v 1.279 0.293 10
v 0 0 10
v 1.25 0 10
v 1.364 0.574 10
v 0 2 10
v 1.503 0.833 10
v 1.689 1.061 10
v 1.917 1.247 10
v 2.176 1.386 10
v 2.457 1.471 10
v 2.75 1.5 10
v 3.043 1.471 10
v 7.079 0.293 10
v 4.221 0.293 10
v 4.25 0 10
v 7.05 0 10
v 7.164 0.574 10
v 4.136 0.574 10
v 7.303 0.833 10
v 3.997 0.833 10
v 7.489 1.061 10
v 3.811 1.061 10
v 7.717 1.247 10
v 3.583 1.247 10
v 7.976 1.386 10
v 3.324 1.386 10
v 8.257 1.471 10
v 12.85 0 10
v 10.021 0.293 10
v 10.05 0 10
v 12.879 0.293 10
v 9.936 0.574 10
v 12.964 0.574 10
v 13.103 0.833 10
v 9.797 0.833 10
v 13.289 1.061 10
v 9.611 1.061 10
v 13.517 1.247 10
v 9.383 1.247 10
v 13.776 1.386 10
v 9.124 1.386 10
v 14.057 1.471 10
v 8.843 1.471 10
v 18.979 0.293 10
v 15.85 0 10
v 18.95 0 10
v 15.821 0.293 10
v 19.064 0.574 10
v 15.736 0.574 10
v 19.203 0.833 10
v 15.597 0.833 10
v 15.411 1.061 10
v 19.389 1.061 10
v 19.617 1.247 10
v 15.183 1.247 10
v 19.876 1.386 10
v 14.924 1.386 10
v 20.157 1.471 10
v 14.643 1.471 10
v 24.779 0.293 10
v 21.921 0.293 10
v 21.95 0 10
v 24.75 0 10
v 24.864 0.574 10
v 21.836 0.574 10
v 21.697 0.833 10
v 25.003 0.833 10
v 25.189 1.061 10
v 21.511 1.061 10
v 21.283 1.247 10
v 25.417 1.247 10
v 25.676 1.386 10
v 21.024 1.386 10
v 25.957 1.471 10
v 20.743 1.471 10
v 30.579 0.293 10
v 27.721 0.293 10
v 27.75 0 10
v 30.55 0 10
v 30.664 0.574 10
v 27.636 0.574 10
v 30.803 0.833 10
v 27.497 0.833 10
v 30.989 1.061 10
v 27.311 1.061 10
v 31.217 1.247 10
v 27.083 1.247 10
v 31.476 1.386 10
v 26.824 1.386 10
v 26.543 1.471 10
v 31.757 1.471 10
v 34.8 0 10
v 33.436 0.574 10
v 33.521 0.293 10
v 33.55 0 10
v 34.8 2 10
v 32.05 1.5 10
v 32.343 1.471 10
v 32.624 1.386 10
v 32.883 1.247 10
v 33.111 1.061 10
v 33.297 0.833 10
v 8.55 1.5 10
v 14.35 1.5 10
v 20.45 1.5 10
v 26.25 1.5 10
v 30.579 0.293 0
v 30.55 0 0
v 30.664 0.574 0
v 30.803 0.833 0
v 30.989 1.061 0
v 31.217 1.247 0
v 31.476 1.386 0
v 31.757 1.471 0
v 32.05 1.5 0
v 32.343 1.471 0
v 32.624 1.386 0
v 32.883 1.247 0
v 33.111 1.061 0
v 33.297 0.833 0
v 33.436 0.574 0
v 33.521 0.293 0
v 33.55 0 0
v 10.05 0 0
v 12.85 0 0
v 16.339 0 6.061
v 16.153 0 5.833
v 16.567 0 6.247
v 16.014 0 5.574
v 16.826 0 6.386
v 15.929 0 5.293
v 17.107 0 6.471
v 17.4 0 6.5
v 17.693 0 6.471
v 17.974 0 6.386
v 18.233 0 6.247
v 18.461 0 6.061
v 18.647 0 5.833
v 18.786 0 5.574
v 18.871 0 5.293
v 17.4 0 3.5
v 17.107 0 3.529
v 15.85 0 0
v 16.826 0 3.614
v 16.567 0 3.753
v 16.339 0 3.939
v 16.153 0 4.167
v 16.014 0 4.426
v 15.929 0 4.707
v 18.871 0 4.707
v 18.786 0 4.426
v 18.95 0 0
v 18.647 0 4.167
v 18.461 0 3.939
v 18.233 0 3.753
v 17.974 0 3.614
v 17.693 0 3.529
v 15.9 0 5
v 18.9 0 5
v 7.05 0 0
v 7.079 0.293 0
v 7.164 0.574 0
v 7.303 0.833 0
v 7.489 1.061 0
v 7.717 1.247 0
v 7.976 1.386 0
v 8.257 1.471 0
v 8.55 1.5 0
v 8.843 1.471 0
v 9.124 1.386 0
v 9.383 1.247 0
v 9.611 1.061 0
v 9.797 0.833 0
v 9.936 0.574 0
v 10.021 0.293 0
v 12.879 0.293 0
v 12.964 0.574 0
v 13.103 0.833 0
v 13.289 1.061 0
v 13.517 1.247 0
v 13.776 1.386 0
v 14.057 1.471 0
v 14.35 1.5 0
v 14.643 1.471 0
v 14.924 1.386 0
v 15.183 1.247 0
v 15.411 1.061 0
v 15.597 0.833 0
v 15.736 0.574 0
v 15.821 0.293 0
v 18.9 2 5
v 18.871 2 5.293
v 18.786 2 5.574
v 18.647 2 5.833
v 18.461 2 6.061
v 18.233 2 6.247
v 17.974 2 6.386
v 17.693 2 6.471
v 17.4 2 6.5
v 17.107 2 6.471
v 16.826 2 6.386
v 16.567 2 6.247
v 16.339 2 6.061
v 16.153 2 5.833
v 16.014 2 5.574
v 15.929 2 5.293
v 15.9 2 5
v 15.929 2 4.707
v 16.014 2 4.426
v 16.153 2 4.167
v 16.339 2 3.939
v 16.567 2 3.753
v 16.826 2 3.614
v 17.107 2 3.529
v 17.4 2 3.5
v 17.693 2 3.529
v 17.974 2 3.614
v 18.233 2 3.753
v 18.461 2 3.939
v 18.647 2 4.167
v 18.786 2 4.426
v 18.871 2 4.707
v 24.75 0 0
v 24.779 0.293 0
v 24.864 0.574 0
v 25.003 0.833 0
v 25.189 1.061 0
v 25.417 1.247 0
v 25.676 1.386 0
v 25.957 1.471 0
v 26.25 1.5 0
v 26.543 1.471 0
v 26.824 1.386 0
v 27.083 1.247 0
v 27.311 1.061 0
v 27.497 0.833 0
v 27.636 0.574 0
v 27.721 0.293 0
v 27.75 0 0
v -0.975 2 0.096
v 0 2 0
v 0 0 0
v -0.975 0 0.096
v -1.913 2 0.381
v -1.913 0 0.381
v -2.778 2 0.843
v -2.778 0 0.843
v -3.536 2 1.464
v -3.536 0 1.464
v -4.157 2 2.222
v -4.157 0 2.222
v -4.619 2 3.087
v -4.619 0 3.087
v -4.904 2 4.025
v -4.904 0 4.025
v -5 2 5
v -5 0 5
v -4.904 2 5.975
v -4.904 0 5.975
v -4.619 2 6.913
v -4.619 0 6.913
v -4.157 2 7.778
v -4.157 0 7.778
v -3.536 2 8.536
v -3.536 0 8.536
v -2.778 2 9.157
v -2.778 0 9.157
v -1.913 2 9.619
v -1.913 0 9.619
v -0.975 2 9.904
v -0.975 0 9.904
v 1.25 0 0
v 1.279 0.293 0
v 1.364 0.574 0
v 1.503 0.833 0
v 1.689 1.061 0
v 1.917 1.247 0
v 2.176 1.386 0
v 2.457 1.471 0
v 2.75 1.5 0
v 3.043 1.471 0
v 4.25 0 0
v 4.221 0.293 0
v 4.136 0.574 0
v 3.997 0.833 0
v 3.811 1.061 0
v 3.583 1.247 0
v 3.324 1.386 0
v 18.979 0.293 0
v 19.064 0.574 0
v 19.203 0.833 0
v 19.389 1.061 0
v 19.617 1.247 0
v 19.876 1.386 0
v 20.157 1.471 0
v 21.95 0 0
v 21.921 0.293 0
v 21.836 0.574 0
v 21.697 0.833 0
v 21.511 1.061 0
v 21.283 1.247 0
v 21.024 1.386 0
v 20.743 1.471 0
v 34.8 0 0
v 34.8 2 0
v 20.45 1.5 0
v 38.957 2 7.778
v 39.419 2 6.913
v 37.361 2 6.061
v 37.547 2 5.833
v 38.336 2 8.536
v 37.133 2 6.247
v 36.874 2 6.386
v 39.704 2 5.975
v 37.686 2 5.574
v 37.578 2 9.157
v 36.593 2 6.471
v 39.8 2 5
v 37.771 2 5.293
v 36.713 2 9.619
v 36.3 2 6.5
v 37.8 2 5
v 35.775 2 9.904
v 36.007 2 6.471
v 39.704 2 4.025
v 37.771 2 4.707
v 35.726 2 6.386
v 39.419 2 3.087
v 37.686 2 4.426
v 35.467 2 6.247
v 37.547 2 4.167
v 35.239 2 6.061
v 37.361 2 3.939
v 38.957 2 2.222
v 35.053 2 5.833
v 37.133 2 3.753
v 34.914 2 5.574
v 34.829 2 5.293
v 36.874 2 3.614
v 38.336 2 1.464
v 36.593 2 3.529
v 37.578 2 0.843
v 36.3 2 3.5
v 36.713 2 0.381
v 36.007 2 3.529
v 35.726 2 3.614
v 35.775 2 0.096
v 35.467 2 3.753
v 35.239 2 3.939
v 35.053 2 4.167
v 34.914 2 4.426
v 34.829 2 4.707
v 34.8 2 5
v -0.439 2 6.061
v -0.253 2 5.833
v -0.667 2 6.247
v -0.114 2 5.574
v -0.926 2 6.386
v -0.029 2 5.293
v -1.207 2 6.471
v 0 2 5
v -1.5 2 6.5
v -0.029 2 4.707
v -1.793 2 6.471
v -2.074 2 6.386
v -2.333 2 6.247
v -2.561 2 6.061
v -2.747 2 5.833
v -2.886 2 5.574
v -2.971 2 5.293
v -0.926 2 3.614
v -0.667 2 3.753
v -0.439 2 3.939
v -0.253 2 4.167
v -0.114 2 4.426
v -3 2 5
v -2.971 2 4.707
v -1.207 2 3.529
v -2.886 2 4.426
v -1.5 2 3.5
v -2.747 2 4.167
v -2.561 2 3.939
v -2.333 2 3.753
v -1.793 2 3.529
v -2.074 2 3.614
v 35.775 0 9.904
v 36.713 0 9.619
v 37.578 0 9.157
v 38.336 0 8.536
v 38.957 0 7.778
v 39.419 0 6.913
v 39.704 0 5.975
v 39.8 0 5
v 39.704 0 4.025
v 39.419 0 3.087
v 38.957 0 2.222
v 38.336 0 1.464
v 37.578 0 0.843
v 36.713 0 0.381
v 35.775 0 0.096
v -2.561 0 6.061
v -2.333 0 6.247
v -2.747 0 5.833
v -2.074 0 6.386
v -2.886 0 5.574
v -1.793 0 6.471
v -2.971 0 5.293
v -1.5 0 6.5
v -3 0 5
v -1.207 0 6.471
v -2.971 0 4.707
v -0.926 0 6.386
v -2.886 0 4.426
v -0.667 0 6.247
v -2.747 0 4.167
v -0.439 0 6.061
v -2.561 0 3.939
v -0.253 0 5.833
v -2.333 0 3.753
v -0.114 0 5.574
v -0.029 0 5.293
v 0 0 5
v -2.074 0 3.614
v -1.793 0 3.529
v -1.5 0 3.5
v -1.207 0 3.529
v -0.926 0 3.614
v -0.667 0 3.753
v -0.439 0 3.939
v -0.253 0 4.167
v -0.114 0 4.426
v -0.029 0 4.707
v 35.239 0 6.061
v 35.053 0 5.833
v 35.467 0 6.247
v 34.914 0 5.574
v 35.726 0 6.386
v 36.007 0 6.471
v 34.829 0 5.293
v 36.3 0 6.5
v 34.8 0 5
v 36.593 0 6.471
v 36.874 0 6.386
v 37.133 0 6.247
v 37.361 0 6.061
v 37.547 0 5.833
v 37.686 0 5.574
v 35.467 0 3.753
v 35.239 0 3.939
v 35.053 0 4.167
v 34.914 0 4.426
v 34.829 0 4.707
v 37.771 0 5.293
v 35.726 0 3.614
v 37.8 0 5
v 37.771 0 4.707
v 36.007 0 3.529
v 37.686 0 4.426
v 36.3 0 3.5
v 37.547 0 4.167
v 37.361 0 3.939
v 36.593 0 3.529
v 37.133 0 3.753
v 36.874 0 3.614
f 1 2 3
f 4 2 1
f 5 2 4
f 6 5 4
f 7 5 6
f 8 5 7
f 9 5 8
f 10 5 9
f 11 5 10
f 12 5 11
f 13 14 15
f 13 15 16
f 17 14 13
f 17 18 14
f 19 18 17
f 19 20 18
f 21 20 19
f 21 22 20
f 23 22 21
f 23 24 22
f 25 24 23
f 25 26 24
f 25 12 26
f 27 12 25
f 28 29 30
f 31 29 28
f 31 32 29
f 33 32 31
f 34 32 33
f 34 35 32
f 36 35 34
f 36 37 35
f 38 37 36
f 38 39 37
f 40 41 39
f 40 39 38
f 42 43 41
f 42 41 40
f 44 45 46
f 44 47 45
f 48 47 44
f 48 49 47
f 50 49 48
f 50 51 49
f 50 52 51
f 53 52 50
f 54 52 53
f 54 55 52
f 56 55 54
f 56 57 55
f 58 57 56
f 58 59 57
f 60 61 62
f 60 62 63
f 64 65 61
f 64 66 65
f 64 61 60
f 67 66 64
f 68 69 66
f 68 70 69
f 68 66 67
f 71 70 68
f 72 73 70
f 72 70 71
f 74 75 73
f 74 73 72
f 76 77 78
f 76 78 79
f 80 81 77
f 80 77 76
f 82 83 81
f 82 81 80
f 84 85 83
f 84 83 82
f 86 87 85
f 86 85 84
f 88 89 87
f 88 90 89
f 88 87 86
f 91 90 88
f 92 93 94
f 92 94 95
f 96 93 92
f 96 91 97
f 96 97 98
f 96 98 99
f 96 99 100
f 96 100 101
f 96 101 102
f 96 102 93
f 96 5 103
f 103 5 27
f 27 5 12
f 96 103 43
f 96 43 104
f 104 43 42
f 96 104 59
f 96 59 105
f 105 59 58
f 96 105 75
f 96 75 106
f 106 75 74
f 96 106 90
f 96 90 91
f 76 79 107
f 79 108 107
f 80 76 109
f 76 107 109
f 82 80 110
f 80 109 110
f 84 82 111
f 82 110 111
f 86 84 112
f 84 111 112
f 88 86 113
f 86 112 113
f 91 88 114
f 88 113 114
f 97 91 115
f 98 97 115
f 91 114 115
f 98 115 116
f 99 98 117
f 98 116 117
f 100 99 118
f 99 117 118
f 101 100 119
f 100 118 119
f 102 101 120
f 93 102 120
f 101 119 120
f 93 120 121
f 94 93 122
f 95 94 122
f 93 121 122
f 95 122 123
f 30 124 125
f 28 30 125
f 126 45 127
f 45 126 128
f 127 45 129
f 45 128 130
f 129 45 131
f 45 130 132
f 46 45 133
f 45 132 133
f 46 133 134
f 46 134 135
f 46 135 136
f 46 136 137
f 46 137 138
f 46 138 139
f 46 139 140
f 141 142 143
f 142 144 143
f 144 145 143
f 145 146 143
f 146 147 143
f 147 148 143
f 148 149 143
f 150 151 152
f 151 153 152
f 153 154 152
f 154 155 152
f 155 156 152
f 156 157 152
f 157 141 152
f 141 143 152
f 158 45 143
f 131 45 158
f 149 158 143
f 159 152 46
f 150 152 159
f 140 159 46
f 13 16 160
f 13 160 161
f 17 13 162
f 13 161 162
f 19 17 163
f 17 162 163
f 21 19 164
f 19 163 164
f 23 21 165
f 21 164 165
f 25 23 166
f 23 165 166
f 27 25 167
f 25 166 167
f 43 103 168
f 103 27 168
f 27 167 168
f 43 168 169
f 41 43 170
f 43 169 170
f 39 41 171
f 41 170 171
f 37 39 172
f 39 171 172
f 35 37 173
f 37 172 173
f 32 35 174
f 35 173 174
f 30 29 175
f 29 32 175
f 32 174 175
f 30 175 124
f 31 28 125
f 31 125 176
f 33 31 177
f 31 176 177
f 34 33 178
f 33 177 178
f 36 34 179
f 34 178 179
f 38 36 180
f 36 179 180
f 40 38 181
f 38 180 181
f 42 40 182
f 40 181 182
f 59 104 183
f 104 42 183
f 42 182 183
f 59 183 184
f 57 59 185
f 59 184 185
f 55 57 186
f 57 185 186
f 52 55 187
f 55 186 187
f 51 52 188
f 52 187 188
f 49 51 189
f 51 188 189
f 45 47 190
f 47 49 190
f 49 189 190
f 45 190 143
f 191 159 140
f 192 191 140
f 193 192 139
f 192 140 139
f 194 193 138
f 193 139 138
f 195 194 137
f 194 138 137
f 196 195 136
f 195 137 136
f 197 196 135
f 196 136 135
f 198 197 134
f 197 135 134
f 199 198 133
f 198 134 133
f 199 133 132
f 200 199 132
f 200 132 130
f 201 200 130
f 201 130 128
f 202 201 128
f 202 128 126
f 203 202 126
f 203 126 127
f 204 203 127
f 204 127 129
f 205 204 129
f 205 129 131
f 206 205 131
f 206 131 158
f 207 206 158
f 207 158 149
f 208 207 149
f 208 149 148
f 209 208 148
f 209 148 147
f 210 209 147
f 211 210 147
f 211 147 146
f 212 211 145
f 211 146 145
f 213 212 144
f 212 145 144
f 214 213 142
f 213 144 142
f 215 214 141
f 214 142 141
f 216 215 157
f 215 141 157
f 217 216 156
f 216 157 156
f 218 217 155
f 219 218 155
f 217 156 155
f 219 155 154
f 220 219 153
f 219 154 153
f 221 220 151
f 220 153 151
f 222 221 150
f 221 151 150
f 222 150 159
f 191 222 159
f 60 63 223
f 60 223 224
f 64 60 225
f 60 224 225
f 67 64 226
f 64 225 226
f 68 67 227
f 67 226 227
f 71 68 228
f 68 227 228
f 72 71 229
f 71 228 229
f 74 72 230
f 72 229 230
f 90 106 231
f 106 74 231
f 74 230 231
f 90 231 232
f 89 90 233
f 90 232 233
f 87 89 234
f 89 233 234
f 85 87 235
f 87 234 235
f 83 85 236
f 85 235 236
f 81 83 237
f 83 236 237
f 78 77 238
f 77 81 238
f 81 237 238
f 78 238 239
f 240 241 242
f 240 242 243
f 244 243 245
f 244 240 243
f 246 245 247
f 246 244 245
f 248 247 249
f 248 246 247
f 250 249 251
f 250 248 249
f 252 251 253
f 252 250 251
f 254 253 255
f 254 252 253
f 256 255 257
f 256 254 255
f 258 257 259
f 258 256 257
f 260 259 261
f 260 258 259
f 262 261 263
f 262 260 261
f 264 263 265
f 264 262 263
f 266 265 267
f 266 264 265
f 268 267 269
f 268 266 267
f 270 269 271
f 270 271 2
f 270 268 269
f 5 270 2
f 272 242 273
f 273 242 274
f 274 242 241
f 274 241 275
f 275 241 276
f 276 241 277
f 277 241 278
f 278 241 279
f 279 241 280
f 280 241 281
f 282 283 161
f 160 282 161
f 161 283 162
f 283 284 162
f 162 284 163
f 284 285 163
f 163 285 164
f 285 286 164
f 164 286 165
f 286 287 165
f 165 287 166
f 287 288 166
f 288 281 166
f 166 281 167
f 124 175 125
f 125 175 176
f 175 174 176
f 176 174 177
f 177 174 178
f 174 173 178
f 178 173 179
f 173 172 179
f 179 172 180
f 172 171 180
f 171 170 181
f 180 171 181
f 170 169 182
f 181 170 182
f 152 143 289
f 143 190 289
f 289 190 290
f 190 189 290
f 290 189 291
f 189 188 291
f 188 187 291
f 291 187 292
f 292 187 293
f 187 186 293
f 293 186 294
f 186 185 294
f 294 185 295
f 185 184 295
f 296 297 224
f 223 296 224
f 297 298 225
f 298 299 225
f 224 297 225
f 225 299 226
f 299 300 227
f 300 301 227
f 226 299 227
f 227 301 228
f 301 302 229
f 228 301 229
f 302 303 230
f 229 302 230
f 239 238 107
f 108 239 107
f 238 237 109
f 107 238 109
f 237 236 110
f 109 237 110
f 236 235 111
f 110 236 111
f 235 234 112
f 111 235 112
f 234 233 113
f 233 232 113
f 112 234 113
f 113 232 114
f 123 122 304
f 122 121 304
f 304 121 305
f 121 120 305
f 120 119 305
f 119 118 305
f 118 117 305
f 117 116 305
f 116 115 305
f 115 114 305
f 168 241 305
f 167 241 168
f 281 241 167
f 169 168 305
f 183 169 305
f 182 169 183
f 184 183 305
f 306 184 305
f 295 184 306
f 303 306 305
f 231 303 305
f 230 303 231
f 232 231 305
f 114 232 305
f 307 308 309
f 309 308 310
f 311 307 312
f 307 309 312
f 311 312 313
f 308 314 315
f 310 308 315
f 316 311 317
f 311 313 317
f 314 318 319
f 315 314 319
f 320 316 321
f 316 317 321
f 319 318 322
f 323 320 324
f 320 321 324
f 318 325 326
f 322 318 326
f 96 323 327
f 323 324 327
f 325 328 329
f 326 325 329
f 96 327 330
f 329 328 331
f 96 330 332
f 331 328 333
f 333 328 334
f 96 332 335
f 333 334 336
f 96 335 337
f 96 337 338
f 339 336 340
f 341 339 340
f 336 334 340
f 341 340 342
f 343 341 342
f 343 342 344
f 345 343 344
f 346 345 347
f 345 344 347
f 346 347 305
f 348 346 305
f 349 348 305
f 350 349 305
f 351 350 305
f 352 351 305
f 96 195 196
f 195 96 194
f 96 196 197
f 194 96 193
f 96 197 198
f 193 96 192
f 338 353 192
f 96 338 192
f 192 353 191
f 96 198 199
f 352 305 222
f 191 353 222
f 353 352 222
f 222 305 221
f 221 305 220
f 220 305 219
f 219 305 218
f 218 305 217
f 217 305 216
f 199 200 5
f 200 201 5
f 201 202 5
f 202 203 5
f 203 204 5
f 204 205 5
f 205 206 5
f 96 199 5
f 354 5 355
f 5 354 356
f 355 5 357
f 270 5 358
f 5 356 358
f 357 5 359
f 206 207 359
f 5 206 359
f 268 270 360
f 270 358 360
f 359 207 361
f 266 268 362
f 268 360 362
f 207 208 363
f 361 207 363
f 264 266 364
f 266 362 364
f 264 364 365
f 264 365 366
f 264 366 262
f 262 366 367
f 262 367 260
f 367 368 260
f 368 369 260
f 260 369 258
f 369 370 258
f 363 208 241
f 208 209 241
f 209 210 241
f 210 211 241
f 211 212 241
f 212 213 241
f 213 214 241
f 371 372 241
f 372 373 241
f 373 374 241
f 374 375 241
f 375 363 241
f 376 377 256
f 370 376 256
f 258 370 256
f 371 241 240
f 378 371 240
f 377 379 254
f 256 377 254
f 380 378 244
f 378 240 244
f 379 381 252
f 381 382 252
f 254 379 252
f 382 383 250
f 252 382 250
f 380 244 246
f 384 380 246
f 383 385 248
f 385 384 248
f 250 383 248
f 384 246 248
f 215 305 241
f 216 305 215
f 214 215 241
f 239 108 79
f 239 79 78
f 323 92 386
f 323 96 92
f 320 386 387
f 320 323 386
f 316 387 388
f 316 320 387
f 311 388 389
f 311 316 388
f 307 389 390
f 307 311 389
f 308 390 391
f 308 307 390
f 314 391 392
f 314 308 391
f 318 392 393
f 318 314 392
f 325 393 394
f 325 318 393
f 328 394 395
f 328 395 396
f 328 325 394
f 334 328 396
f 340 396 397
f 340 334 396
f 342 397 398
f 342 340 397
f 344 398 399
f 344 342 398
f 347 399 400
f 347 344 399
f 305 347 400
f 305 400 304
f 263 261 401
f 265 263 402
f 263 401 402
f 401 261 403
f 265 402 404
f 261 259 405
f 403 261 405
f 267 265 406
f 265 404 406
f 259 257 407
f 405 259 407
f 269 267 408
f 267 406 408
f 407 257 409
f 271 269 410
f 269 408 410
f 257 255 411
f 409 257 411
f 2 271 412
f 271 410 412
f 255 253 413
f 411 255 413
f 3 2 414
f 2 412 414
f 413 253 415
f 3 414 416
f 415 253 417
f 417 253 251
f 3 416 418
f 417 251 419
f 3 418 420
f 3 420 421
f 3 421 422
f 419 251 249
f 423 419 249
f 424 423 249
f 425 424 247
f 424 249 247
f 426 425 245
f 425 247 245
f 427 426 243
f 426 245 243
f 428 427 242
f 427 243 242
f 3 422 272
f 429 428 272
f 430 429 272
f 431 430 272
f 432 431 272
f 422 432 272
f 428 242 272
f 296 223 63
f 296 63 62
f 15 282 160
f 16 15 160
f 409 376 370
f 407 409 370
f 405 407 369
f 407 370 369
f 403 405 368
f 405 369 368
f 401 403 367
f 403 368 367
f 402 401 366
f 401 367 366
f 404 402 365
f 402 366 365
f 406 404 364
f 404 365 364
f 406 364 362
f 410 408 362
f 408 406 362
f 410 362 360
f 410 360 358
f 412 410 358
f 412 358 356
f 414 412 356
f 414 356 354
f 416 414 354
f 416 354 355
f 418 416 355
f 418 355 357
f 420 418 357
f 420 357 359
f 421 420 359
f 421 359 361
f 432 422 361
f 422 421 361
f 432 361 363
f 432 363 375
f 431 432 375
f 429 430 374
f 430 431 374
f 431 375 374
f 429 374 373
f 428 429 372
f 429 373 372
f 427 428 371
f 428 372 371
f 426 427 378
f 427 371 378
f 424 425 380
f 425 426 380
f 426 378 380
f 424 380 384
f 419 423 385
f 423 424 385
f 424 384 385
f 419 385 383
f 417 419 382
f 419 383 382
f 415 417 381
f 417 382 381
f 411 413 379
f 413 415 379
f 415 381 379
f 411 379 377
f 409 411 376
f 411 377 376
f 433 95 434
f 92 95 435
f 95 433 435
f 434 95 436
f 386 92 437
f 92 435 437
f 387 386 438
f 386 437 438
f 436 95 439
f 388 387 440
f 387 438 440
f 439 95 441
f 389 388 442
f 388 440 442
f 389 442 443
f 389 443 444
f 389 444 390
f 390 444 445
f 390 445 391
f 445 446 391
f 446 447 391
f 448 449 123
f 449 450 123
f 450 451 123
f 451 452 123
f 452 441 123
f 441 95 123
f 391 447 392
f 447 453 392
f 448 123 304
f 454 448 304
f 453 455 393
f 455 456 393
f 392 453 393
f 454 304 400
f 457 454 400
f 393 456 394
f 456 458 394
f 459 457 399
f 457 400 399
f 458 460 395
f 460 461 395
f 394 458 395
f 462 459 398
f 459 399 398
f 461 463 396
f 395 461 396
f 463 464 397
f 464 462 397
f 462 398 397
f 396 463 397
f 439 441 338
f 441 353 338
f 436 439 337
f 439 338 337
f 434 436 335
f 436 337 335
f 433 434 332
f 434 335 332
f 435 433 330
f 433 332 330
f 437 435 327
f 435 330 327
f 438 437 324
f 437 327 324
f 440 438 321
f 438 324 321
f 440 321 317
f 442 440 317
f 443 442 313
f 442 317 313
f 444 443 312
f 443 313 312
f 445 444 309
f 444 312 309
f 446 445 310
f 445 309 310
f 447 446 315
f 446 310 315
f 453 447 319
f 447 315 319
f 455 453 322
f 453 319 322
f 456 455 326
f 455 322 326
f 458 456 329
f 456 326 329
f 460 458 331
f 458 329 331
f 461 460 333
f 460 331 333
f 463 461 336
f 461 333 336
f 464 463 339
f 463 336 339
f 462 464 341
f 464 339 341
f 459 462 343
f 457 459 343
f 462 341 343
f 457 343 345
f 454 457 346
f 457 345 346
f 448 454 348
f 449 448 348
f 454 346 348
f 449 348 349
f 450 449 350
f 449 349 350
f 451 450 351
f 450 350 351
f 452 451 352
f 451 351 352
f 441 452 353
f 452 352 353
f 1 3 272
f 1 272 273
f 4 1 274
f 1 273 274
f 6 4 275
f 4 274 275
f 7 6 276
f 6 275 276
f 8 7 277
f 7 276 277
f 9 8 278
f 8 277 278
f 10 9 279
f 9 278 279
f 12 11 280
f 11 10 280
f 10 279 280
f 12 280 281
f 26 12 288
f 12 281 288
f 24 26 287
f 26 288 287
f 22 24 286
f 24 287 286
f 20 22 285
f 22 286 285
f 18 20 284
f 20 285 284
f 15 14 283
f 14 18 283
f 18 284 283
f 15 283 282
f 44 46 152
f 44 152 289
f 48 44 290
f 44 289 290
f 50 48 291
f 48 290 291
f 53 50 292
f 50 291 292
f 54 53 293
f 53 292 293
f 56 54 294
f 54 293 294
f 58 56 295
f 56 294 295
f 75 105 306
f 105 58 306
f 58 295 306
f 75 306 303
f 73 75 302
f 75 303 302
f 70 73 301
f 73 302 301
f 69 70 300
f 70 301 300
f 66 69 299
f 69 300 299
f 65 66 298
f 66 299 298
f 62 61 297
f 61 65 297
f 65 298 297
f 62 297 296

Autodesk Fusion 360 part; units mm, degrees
sketch "Sketch1" plane through (0, 0, 0) normal (0, 0, 1) x (1, 0, 0)
  line L0 (0, 0) -> (17.1, 0)
  line L1 (17.1, 0) -> (17.1, 2)
  line L2 (17.1, 2) -> (0, 2)
  line L3 (0, 2) -> (0, 0)
  line L4 (0, 0) -> (1.25, 0)
  line L5 (1.25, 0) -> (2.75, 0)
  circle A0 centre (2.75, 0) radius 1.5
  line L6 (4.25, 0) -> (7.05, 0)
  line L7 (7.05, 0) -> (8.55, 0)
  circle A1 centre (8.55, 0) radius 1.5
  line L8 (10.05, 0) -> (12.85, 0)
  line L9 (12.85, 0) -> (14.35, 0)
  circle A2 centre (14.35, 0) radius 1.5
  line L10 (15.85, 0) -> (17.1, 0)
  line L11 (15.85, 0) -> (17.4, 0)
  line L12 (17.4, 0) -> (18.95, 0)
  line L13 (18.95, 0) -> (17.1, 0)
  line L14 (17.1, 0) -> (17.1, 2)
  line L15 (17.1, 2) -> (18.95, 2)
  line L16 (18.95, 2) -> (18.95, 0)
  line L17 (17.1, 2) -> (34.2, 2)
  line L18 (34.2, 0) -> (17.1, 0)
  line L19 (18.95, 0) -> (20.45, 0)
  circle A3 centre (20.45, 0) radius 1.5
  line L20 (21.95, 0) -> (24.75, 0)
  line L21 (24.75, 0) -> (26.25, 0)
  circle A4 centre (26.25, 0) radius 1.5
  line L22 (27.75, 0) -> (30.55, 0)
  line L23 (30.55, 0) -> (32.05, 0)
  circle A5 centre (32.05, 0) radius 1.5
  line L24 (33.55, 0) -> (34.8, 0)
  line L25 (34.8, 0) -> (33.05, 0)
  line L26 (33.05, 0) -> (33.05, 2)
  line L27 (33.05, 2) -> (34.8, 2)
  line L28 (34.8, 2) -> (34.8, 0)
  dimension "d1" = 17.1
  dimension "d2" = 2
  dimension "d3" = 1.25
  dimension "d4" = 1.5
  dimension "d5" = 2.8
  dimension "d6" = 1.5
  dimension "d7" = 2.8
  dimension "d8" = 1.5
  dimension "d32" = 1.55
  dimension "d33" = 1.55
  dimension "d39" = 1.5
  dimension "d41" = 2.8
  dimension "d42" = 1.5
  dimension "d43" = 2.8
  dimension "d44" = 1.5
  dimension "d45" = 1.25
extrude "Extrude1" add sketch "Sketch1" along normal blind 10 contours L0 L1 L2 L3 L4 A0 L6 A1 L8 A2 L10 L11 L14 | L1 L11 L12 L13 L14 L15 L16 L17 L18 | L16 L17 L18 A3 L20 A4 L22 A5 L26 | L17 L18 A5 L24 L25 L26 L27 L28
sketch "Sketch10" plane through (0, 0, 0) normal (0, -1, 0) x (1, 0, 0)
  line L0 (15.85, 0) -> (18.95, 0)
  line L1 (18.95, 0) -> (18.95, 10)
  line L2 (18.95, 10) -> (15.85, 10)
  line L3 (15.85, 10) -> (15.85, 0)
  line L4 (15.85, 0) -> (18.95, 0)
  line L5 (17.4, 0) -> (17.4, 10)
  circle A0 centre (17.4, 5) radius 1.5
  dimension "d46" = 3
extrude "Extrude6" cut sketch "Sketch10" against normal blind 2.6 contours L5 A0 | L5 A0
sketch "Sketch7" plane through (0, 2, 0) normal (0, 1, 0) x (-1, 0, 0)
  line L0 (-34.8, 0) -> (0, 0)
  line L1 (0, 0) -> (0, 10)
  line L2 (0, 10) -> (-34.8, 10)
  line L3 (0, 0) -> (0, 10)
  line L4 (0, 0) -> (-34.8, 0)
  line L5 (-17.4, 0) -> (-17.4, 10)
  circle A0 centre (0, 5) radius 5
  line L6 (0, 5) -> (5, 5)
  circle A1 centre (-17.4, 5) radius 1.5
  line L7 (-34.8, 10) -> (-34.8, 0)
  line L8 (2.5, 5) -> (0, 5)
  line L9 (2.5, 5) -> (2.1, 5)
  line L10 (2.5, 5) -> (0.5, 5)
  line L11 (2.5, 5) -> (1, 5)
  line L12 (1, 5) -> (1.5, 5)
  circle A2 centre (1.5, 5) radius 1.5
  circle A3 centre (-34.8, 5) radius 5
  circle A4 centre (-36.3, 5) radius 1.5
  line L13 (0, 10) -> (-1.25, 10)
  line L14 (-1.25, 10) -> (-1.25, 0)
  line L15 (5, 5) -> (-1.25, 5)
  dimension "d49" = 0.4
  dimension "d50" = 2
  dimension "d52" = 0.5
extrude "Extrude5" add sketch "Sketch7" against normal blind 2 contours L7 A3 | L1 L3 A0 L6 A2 L15 | L1 L3 A0 L6 A2 L15 picked at (-35.3657, 1.2198)
